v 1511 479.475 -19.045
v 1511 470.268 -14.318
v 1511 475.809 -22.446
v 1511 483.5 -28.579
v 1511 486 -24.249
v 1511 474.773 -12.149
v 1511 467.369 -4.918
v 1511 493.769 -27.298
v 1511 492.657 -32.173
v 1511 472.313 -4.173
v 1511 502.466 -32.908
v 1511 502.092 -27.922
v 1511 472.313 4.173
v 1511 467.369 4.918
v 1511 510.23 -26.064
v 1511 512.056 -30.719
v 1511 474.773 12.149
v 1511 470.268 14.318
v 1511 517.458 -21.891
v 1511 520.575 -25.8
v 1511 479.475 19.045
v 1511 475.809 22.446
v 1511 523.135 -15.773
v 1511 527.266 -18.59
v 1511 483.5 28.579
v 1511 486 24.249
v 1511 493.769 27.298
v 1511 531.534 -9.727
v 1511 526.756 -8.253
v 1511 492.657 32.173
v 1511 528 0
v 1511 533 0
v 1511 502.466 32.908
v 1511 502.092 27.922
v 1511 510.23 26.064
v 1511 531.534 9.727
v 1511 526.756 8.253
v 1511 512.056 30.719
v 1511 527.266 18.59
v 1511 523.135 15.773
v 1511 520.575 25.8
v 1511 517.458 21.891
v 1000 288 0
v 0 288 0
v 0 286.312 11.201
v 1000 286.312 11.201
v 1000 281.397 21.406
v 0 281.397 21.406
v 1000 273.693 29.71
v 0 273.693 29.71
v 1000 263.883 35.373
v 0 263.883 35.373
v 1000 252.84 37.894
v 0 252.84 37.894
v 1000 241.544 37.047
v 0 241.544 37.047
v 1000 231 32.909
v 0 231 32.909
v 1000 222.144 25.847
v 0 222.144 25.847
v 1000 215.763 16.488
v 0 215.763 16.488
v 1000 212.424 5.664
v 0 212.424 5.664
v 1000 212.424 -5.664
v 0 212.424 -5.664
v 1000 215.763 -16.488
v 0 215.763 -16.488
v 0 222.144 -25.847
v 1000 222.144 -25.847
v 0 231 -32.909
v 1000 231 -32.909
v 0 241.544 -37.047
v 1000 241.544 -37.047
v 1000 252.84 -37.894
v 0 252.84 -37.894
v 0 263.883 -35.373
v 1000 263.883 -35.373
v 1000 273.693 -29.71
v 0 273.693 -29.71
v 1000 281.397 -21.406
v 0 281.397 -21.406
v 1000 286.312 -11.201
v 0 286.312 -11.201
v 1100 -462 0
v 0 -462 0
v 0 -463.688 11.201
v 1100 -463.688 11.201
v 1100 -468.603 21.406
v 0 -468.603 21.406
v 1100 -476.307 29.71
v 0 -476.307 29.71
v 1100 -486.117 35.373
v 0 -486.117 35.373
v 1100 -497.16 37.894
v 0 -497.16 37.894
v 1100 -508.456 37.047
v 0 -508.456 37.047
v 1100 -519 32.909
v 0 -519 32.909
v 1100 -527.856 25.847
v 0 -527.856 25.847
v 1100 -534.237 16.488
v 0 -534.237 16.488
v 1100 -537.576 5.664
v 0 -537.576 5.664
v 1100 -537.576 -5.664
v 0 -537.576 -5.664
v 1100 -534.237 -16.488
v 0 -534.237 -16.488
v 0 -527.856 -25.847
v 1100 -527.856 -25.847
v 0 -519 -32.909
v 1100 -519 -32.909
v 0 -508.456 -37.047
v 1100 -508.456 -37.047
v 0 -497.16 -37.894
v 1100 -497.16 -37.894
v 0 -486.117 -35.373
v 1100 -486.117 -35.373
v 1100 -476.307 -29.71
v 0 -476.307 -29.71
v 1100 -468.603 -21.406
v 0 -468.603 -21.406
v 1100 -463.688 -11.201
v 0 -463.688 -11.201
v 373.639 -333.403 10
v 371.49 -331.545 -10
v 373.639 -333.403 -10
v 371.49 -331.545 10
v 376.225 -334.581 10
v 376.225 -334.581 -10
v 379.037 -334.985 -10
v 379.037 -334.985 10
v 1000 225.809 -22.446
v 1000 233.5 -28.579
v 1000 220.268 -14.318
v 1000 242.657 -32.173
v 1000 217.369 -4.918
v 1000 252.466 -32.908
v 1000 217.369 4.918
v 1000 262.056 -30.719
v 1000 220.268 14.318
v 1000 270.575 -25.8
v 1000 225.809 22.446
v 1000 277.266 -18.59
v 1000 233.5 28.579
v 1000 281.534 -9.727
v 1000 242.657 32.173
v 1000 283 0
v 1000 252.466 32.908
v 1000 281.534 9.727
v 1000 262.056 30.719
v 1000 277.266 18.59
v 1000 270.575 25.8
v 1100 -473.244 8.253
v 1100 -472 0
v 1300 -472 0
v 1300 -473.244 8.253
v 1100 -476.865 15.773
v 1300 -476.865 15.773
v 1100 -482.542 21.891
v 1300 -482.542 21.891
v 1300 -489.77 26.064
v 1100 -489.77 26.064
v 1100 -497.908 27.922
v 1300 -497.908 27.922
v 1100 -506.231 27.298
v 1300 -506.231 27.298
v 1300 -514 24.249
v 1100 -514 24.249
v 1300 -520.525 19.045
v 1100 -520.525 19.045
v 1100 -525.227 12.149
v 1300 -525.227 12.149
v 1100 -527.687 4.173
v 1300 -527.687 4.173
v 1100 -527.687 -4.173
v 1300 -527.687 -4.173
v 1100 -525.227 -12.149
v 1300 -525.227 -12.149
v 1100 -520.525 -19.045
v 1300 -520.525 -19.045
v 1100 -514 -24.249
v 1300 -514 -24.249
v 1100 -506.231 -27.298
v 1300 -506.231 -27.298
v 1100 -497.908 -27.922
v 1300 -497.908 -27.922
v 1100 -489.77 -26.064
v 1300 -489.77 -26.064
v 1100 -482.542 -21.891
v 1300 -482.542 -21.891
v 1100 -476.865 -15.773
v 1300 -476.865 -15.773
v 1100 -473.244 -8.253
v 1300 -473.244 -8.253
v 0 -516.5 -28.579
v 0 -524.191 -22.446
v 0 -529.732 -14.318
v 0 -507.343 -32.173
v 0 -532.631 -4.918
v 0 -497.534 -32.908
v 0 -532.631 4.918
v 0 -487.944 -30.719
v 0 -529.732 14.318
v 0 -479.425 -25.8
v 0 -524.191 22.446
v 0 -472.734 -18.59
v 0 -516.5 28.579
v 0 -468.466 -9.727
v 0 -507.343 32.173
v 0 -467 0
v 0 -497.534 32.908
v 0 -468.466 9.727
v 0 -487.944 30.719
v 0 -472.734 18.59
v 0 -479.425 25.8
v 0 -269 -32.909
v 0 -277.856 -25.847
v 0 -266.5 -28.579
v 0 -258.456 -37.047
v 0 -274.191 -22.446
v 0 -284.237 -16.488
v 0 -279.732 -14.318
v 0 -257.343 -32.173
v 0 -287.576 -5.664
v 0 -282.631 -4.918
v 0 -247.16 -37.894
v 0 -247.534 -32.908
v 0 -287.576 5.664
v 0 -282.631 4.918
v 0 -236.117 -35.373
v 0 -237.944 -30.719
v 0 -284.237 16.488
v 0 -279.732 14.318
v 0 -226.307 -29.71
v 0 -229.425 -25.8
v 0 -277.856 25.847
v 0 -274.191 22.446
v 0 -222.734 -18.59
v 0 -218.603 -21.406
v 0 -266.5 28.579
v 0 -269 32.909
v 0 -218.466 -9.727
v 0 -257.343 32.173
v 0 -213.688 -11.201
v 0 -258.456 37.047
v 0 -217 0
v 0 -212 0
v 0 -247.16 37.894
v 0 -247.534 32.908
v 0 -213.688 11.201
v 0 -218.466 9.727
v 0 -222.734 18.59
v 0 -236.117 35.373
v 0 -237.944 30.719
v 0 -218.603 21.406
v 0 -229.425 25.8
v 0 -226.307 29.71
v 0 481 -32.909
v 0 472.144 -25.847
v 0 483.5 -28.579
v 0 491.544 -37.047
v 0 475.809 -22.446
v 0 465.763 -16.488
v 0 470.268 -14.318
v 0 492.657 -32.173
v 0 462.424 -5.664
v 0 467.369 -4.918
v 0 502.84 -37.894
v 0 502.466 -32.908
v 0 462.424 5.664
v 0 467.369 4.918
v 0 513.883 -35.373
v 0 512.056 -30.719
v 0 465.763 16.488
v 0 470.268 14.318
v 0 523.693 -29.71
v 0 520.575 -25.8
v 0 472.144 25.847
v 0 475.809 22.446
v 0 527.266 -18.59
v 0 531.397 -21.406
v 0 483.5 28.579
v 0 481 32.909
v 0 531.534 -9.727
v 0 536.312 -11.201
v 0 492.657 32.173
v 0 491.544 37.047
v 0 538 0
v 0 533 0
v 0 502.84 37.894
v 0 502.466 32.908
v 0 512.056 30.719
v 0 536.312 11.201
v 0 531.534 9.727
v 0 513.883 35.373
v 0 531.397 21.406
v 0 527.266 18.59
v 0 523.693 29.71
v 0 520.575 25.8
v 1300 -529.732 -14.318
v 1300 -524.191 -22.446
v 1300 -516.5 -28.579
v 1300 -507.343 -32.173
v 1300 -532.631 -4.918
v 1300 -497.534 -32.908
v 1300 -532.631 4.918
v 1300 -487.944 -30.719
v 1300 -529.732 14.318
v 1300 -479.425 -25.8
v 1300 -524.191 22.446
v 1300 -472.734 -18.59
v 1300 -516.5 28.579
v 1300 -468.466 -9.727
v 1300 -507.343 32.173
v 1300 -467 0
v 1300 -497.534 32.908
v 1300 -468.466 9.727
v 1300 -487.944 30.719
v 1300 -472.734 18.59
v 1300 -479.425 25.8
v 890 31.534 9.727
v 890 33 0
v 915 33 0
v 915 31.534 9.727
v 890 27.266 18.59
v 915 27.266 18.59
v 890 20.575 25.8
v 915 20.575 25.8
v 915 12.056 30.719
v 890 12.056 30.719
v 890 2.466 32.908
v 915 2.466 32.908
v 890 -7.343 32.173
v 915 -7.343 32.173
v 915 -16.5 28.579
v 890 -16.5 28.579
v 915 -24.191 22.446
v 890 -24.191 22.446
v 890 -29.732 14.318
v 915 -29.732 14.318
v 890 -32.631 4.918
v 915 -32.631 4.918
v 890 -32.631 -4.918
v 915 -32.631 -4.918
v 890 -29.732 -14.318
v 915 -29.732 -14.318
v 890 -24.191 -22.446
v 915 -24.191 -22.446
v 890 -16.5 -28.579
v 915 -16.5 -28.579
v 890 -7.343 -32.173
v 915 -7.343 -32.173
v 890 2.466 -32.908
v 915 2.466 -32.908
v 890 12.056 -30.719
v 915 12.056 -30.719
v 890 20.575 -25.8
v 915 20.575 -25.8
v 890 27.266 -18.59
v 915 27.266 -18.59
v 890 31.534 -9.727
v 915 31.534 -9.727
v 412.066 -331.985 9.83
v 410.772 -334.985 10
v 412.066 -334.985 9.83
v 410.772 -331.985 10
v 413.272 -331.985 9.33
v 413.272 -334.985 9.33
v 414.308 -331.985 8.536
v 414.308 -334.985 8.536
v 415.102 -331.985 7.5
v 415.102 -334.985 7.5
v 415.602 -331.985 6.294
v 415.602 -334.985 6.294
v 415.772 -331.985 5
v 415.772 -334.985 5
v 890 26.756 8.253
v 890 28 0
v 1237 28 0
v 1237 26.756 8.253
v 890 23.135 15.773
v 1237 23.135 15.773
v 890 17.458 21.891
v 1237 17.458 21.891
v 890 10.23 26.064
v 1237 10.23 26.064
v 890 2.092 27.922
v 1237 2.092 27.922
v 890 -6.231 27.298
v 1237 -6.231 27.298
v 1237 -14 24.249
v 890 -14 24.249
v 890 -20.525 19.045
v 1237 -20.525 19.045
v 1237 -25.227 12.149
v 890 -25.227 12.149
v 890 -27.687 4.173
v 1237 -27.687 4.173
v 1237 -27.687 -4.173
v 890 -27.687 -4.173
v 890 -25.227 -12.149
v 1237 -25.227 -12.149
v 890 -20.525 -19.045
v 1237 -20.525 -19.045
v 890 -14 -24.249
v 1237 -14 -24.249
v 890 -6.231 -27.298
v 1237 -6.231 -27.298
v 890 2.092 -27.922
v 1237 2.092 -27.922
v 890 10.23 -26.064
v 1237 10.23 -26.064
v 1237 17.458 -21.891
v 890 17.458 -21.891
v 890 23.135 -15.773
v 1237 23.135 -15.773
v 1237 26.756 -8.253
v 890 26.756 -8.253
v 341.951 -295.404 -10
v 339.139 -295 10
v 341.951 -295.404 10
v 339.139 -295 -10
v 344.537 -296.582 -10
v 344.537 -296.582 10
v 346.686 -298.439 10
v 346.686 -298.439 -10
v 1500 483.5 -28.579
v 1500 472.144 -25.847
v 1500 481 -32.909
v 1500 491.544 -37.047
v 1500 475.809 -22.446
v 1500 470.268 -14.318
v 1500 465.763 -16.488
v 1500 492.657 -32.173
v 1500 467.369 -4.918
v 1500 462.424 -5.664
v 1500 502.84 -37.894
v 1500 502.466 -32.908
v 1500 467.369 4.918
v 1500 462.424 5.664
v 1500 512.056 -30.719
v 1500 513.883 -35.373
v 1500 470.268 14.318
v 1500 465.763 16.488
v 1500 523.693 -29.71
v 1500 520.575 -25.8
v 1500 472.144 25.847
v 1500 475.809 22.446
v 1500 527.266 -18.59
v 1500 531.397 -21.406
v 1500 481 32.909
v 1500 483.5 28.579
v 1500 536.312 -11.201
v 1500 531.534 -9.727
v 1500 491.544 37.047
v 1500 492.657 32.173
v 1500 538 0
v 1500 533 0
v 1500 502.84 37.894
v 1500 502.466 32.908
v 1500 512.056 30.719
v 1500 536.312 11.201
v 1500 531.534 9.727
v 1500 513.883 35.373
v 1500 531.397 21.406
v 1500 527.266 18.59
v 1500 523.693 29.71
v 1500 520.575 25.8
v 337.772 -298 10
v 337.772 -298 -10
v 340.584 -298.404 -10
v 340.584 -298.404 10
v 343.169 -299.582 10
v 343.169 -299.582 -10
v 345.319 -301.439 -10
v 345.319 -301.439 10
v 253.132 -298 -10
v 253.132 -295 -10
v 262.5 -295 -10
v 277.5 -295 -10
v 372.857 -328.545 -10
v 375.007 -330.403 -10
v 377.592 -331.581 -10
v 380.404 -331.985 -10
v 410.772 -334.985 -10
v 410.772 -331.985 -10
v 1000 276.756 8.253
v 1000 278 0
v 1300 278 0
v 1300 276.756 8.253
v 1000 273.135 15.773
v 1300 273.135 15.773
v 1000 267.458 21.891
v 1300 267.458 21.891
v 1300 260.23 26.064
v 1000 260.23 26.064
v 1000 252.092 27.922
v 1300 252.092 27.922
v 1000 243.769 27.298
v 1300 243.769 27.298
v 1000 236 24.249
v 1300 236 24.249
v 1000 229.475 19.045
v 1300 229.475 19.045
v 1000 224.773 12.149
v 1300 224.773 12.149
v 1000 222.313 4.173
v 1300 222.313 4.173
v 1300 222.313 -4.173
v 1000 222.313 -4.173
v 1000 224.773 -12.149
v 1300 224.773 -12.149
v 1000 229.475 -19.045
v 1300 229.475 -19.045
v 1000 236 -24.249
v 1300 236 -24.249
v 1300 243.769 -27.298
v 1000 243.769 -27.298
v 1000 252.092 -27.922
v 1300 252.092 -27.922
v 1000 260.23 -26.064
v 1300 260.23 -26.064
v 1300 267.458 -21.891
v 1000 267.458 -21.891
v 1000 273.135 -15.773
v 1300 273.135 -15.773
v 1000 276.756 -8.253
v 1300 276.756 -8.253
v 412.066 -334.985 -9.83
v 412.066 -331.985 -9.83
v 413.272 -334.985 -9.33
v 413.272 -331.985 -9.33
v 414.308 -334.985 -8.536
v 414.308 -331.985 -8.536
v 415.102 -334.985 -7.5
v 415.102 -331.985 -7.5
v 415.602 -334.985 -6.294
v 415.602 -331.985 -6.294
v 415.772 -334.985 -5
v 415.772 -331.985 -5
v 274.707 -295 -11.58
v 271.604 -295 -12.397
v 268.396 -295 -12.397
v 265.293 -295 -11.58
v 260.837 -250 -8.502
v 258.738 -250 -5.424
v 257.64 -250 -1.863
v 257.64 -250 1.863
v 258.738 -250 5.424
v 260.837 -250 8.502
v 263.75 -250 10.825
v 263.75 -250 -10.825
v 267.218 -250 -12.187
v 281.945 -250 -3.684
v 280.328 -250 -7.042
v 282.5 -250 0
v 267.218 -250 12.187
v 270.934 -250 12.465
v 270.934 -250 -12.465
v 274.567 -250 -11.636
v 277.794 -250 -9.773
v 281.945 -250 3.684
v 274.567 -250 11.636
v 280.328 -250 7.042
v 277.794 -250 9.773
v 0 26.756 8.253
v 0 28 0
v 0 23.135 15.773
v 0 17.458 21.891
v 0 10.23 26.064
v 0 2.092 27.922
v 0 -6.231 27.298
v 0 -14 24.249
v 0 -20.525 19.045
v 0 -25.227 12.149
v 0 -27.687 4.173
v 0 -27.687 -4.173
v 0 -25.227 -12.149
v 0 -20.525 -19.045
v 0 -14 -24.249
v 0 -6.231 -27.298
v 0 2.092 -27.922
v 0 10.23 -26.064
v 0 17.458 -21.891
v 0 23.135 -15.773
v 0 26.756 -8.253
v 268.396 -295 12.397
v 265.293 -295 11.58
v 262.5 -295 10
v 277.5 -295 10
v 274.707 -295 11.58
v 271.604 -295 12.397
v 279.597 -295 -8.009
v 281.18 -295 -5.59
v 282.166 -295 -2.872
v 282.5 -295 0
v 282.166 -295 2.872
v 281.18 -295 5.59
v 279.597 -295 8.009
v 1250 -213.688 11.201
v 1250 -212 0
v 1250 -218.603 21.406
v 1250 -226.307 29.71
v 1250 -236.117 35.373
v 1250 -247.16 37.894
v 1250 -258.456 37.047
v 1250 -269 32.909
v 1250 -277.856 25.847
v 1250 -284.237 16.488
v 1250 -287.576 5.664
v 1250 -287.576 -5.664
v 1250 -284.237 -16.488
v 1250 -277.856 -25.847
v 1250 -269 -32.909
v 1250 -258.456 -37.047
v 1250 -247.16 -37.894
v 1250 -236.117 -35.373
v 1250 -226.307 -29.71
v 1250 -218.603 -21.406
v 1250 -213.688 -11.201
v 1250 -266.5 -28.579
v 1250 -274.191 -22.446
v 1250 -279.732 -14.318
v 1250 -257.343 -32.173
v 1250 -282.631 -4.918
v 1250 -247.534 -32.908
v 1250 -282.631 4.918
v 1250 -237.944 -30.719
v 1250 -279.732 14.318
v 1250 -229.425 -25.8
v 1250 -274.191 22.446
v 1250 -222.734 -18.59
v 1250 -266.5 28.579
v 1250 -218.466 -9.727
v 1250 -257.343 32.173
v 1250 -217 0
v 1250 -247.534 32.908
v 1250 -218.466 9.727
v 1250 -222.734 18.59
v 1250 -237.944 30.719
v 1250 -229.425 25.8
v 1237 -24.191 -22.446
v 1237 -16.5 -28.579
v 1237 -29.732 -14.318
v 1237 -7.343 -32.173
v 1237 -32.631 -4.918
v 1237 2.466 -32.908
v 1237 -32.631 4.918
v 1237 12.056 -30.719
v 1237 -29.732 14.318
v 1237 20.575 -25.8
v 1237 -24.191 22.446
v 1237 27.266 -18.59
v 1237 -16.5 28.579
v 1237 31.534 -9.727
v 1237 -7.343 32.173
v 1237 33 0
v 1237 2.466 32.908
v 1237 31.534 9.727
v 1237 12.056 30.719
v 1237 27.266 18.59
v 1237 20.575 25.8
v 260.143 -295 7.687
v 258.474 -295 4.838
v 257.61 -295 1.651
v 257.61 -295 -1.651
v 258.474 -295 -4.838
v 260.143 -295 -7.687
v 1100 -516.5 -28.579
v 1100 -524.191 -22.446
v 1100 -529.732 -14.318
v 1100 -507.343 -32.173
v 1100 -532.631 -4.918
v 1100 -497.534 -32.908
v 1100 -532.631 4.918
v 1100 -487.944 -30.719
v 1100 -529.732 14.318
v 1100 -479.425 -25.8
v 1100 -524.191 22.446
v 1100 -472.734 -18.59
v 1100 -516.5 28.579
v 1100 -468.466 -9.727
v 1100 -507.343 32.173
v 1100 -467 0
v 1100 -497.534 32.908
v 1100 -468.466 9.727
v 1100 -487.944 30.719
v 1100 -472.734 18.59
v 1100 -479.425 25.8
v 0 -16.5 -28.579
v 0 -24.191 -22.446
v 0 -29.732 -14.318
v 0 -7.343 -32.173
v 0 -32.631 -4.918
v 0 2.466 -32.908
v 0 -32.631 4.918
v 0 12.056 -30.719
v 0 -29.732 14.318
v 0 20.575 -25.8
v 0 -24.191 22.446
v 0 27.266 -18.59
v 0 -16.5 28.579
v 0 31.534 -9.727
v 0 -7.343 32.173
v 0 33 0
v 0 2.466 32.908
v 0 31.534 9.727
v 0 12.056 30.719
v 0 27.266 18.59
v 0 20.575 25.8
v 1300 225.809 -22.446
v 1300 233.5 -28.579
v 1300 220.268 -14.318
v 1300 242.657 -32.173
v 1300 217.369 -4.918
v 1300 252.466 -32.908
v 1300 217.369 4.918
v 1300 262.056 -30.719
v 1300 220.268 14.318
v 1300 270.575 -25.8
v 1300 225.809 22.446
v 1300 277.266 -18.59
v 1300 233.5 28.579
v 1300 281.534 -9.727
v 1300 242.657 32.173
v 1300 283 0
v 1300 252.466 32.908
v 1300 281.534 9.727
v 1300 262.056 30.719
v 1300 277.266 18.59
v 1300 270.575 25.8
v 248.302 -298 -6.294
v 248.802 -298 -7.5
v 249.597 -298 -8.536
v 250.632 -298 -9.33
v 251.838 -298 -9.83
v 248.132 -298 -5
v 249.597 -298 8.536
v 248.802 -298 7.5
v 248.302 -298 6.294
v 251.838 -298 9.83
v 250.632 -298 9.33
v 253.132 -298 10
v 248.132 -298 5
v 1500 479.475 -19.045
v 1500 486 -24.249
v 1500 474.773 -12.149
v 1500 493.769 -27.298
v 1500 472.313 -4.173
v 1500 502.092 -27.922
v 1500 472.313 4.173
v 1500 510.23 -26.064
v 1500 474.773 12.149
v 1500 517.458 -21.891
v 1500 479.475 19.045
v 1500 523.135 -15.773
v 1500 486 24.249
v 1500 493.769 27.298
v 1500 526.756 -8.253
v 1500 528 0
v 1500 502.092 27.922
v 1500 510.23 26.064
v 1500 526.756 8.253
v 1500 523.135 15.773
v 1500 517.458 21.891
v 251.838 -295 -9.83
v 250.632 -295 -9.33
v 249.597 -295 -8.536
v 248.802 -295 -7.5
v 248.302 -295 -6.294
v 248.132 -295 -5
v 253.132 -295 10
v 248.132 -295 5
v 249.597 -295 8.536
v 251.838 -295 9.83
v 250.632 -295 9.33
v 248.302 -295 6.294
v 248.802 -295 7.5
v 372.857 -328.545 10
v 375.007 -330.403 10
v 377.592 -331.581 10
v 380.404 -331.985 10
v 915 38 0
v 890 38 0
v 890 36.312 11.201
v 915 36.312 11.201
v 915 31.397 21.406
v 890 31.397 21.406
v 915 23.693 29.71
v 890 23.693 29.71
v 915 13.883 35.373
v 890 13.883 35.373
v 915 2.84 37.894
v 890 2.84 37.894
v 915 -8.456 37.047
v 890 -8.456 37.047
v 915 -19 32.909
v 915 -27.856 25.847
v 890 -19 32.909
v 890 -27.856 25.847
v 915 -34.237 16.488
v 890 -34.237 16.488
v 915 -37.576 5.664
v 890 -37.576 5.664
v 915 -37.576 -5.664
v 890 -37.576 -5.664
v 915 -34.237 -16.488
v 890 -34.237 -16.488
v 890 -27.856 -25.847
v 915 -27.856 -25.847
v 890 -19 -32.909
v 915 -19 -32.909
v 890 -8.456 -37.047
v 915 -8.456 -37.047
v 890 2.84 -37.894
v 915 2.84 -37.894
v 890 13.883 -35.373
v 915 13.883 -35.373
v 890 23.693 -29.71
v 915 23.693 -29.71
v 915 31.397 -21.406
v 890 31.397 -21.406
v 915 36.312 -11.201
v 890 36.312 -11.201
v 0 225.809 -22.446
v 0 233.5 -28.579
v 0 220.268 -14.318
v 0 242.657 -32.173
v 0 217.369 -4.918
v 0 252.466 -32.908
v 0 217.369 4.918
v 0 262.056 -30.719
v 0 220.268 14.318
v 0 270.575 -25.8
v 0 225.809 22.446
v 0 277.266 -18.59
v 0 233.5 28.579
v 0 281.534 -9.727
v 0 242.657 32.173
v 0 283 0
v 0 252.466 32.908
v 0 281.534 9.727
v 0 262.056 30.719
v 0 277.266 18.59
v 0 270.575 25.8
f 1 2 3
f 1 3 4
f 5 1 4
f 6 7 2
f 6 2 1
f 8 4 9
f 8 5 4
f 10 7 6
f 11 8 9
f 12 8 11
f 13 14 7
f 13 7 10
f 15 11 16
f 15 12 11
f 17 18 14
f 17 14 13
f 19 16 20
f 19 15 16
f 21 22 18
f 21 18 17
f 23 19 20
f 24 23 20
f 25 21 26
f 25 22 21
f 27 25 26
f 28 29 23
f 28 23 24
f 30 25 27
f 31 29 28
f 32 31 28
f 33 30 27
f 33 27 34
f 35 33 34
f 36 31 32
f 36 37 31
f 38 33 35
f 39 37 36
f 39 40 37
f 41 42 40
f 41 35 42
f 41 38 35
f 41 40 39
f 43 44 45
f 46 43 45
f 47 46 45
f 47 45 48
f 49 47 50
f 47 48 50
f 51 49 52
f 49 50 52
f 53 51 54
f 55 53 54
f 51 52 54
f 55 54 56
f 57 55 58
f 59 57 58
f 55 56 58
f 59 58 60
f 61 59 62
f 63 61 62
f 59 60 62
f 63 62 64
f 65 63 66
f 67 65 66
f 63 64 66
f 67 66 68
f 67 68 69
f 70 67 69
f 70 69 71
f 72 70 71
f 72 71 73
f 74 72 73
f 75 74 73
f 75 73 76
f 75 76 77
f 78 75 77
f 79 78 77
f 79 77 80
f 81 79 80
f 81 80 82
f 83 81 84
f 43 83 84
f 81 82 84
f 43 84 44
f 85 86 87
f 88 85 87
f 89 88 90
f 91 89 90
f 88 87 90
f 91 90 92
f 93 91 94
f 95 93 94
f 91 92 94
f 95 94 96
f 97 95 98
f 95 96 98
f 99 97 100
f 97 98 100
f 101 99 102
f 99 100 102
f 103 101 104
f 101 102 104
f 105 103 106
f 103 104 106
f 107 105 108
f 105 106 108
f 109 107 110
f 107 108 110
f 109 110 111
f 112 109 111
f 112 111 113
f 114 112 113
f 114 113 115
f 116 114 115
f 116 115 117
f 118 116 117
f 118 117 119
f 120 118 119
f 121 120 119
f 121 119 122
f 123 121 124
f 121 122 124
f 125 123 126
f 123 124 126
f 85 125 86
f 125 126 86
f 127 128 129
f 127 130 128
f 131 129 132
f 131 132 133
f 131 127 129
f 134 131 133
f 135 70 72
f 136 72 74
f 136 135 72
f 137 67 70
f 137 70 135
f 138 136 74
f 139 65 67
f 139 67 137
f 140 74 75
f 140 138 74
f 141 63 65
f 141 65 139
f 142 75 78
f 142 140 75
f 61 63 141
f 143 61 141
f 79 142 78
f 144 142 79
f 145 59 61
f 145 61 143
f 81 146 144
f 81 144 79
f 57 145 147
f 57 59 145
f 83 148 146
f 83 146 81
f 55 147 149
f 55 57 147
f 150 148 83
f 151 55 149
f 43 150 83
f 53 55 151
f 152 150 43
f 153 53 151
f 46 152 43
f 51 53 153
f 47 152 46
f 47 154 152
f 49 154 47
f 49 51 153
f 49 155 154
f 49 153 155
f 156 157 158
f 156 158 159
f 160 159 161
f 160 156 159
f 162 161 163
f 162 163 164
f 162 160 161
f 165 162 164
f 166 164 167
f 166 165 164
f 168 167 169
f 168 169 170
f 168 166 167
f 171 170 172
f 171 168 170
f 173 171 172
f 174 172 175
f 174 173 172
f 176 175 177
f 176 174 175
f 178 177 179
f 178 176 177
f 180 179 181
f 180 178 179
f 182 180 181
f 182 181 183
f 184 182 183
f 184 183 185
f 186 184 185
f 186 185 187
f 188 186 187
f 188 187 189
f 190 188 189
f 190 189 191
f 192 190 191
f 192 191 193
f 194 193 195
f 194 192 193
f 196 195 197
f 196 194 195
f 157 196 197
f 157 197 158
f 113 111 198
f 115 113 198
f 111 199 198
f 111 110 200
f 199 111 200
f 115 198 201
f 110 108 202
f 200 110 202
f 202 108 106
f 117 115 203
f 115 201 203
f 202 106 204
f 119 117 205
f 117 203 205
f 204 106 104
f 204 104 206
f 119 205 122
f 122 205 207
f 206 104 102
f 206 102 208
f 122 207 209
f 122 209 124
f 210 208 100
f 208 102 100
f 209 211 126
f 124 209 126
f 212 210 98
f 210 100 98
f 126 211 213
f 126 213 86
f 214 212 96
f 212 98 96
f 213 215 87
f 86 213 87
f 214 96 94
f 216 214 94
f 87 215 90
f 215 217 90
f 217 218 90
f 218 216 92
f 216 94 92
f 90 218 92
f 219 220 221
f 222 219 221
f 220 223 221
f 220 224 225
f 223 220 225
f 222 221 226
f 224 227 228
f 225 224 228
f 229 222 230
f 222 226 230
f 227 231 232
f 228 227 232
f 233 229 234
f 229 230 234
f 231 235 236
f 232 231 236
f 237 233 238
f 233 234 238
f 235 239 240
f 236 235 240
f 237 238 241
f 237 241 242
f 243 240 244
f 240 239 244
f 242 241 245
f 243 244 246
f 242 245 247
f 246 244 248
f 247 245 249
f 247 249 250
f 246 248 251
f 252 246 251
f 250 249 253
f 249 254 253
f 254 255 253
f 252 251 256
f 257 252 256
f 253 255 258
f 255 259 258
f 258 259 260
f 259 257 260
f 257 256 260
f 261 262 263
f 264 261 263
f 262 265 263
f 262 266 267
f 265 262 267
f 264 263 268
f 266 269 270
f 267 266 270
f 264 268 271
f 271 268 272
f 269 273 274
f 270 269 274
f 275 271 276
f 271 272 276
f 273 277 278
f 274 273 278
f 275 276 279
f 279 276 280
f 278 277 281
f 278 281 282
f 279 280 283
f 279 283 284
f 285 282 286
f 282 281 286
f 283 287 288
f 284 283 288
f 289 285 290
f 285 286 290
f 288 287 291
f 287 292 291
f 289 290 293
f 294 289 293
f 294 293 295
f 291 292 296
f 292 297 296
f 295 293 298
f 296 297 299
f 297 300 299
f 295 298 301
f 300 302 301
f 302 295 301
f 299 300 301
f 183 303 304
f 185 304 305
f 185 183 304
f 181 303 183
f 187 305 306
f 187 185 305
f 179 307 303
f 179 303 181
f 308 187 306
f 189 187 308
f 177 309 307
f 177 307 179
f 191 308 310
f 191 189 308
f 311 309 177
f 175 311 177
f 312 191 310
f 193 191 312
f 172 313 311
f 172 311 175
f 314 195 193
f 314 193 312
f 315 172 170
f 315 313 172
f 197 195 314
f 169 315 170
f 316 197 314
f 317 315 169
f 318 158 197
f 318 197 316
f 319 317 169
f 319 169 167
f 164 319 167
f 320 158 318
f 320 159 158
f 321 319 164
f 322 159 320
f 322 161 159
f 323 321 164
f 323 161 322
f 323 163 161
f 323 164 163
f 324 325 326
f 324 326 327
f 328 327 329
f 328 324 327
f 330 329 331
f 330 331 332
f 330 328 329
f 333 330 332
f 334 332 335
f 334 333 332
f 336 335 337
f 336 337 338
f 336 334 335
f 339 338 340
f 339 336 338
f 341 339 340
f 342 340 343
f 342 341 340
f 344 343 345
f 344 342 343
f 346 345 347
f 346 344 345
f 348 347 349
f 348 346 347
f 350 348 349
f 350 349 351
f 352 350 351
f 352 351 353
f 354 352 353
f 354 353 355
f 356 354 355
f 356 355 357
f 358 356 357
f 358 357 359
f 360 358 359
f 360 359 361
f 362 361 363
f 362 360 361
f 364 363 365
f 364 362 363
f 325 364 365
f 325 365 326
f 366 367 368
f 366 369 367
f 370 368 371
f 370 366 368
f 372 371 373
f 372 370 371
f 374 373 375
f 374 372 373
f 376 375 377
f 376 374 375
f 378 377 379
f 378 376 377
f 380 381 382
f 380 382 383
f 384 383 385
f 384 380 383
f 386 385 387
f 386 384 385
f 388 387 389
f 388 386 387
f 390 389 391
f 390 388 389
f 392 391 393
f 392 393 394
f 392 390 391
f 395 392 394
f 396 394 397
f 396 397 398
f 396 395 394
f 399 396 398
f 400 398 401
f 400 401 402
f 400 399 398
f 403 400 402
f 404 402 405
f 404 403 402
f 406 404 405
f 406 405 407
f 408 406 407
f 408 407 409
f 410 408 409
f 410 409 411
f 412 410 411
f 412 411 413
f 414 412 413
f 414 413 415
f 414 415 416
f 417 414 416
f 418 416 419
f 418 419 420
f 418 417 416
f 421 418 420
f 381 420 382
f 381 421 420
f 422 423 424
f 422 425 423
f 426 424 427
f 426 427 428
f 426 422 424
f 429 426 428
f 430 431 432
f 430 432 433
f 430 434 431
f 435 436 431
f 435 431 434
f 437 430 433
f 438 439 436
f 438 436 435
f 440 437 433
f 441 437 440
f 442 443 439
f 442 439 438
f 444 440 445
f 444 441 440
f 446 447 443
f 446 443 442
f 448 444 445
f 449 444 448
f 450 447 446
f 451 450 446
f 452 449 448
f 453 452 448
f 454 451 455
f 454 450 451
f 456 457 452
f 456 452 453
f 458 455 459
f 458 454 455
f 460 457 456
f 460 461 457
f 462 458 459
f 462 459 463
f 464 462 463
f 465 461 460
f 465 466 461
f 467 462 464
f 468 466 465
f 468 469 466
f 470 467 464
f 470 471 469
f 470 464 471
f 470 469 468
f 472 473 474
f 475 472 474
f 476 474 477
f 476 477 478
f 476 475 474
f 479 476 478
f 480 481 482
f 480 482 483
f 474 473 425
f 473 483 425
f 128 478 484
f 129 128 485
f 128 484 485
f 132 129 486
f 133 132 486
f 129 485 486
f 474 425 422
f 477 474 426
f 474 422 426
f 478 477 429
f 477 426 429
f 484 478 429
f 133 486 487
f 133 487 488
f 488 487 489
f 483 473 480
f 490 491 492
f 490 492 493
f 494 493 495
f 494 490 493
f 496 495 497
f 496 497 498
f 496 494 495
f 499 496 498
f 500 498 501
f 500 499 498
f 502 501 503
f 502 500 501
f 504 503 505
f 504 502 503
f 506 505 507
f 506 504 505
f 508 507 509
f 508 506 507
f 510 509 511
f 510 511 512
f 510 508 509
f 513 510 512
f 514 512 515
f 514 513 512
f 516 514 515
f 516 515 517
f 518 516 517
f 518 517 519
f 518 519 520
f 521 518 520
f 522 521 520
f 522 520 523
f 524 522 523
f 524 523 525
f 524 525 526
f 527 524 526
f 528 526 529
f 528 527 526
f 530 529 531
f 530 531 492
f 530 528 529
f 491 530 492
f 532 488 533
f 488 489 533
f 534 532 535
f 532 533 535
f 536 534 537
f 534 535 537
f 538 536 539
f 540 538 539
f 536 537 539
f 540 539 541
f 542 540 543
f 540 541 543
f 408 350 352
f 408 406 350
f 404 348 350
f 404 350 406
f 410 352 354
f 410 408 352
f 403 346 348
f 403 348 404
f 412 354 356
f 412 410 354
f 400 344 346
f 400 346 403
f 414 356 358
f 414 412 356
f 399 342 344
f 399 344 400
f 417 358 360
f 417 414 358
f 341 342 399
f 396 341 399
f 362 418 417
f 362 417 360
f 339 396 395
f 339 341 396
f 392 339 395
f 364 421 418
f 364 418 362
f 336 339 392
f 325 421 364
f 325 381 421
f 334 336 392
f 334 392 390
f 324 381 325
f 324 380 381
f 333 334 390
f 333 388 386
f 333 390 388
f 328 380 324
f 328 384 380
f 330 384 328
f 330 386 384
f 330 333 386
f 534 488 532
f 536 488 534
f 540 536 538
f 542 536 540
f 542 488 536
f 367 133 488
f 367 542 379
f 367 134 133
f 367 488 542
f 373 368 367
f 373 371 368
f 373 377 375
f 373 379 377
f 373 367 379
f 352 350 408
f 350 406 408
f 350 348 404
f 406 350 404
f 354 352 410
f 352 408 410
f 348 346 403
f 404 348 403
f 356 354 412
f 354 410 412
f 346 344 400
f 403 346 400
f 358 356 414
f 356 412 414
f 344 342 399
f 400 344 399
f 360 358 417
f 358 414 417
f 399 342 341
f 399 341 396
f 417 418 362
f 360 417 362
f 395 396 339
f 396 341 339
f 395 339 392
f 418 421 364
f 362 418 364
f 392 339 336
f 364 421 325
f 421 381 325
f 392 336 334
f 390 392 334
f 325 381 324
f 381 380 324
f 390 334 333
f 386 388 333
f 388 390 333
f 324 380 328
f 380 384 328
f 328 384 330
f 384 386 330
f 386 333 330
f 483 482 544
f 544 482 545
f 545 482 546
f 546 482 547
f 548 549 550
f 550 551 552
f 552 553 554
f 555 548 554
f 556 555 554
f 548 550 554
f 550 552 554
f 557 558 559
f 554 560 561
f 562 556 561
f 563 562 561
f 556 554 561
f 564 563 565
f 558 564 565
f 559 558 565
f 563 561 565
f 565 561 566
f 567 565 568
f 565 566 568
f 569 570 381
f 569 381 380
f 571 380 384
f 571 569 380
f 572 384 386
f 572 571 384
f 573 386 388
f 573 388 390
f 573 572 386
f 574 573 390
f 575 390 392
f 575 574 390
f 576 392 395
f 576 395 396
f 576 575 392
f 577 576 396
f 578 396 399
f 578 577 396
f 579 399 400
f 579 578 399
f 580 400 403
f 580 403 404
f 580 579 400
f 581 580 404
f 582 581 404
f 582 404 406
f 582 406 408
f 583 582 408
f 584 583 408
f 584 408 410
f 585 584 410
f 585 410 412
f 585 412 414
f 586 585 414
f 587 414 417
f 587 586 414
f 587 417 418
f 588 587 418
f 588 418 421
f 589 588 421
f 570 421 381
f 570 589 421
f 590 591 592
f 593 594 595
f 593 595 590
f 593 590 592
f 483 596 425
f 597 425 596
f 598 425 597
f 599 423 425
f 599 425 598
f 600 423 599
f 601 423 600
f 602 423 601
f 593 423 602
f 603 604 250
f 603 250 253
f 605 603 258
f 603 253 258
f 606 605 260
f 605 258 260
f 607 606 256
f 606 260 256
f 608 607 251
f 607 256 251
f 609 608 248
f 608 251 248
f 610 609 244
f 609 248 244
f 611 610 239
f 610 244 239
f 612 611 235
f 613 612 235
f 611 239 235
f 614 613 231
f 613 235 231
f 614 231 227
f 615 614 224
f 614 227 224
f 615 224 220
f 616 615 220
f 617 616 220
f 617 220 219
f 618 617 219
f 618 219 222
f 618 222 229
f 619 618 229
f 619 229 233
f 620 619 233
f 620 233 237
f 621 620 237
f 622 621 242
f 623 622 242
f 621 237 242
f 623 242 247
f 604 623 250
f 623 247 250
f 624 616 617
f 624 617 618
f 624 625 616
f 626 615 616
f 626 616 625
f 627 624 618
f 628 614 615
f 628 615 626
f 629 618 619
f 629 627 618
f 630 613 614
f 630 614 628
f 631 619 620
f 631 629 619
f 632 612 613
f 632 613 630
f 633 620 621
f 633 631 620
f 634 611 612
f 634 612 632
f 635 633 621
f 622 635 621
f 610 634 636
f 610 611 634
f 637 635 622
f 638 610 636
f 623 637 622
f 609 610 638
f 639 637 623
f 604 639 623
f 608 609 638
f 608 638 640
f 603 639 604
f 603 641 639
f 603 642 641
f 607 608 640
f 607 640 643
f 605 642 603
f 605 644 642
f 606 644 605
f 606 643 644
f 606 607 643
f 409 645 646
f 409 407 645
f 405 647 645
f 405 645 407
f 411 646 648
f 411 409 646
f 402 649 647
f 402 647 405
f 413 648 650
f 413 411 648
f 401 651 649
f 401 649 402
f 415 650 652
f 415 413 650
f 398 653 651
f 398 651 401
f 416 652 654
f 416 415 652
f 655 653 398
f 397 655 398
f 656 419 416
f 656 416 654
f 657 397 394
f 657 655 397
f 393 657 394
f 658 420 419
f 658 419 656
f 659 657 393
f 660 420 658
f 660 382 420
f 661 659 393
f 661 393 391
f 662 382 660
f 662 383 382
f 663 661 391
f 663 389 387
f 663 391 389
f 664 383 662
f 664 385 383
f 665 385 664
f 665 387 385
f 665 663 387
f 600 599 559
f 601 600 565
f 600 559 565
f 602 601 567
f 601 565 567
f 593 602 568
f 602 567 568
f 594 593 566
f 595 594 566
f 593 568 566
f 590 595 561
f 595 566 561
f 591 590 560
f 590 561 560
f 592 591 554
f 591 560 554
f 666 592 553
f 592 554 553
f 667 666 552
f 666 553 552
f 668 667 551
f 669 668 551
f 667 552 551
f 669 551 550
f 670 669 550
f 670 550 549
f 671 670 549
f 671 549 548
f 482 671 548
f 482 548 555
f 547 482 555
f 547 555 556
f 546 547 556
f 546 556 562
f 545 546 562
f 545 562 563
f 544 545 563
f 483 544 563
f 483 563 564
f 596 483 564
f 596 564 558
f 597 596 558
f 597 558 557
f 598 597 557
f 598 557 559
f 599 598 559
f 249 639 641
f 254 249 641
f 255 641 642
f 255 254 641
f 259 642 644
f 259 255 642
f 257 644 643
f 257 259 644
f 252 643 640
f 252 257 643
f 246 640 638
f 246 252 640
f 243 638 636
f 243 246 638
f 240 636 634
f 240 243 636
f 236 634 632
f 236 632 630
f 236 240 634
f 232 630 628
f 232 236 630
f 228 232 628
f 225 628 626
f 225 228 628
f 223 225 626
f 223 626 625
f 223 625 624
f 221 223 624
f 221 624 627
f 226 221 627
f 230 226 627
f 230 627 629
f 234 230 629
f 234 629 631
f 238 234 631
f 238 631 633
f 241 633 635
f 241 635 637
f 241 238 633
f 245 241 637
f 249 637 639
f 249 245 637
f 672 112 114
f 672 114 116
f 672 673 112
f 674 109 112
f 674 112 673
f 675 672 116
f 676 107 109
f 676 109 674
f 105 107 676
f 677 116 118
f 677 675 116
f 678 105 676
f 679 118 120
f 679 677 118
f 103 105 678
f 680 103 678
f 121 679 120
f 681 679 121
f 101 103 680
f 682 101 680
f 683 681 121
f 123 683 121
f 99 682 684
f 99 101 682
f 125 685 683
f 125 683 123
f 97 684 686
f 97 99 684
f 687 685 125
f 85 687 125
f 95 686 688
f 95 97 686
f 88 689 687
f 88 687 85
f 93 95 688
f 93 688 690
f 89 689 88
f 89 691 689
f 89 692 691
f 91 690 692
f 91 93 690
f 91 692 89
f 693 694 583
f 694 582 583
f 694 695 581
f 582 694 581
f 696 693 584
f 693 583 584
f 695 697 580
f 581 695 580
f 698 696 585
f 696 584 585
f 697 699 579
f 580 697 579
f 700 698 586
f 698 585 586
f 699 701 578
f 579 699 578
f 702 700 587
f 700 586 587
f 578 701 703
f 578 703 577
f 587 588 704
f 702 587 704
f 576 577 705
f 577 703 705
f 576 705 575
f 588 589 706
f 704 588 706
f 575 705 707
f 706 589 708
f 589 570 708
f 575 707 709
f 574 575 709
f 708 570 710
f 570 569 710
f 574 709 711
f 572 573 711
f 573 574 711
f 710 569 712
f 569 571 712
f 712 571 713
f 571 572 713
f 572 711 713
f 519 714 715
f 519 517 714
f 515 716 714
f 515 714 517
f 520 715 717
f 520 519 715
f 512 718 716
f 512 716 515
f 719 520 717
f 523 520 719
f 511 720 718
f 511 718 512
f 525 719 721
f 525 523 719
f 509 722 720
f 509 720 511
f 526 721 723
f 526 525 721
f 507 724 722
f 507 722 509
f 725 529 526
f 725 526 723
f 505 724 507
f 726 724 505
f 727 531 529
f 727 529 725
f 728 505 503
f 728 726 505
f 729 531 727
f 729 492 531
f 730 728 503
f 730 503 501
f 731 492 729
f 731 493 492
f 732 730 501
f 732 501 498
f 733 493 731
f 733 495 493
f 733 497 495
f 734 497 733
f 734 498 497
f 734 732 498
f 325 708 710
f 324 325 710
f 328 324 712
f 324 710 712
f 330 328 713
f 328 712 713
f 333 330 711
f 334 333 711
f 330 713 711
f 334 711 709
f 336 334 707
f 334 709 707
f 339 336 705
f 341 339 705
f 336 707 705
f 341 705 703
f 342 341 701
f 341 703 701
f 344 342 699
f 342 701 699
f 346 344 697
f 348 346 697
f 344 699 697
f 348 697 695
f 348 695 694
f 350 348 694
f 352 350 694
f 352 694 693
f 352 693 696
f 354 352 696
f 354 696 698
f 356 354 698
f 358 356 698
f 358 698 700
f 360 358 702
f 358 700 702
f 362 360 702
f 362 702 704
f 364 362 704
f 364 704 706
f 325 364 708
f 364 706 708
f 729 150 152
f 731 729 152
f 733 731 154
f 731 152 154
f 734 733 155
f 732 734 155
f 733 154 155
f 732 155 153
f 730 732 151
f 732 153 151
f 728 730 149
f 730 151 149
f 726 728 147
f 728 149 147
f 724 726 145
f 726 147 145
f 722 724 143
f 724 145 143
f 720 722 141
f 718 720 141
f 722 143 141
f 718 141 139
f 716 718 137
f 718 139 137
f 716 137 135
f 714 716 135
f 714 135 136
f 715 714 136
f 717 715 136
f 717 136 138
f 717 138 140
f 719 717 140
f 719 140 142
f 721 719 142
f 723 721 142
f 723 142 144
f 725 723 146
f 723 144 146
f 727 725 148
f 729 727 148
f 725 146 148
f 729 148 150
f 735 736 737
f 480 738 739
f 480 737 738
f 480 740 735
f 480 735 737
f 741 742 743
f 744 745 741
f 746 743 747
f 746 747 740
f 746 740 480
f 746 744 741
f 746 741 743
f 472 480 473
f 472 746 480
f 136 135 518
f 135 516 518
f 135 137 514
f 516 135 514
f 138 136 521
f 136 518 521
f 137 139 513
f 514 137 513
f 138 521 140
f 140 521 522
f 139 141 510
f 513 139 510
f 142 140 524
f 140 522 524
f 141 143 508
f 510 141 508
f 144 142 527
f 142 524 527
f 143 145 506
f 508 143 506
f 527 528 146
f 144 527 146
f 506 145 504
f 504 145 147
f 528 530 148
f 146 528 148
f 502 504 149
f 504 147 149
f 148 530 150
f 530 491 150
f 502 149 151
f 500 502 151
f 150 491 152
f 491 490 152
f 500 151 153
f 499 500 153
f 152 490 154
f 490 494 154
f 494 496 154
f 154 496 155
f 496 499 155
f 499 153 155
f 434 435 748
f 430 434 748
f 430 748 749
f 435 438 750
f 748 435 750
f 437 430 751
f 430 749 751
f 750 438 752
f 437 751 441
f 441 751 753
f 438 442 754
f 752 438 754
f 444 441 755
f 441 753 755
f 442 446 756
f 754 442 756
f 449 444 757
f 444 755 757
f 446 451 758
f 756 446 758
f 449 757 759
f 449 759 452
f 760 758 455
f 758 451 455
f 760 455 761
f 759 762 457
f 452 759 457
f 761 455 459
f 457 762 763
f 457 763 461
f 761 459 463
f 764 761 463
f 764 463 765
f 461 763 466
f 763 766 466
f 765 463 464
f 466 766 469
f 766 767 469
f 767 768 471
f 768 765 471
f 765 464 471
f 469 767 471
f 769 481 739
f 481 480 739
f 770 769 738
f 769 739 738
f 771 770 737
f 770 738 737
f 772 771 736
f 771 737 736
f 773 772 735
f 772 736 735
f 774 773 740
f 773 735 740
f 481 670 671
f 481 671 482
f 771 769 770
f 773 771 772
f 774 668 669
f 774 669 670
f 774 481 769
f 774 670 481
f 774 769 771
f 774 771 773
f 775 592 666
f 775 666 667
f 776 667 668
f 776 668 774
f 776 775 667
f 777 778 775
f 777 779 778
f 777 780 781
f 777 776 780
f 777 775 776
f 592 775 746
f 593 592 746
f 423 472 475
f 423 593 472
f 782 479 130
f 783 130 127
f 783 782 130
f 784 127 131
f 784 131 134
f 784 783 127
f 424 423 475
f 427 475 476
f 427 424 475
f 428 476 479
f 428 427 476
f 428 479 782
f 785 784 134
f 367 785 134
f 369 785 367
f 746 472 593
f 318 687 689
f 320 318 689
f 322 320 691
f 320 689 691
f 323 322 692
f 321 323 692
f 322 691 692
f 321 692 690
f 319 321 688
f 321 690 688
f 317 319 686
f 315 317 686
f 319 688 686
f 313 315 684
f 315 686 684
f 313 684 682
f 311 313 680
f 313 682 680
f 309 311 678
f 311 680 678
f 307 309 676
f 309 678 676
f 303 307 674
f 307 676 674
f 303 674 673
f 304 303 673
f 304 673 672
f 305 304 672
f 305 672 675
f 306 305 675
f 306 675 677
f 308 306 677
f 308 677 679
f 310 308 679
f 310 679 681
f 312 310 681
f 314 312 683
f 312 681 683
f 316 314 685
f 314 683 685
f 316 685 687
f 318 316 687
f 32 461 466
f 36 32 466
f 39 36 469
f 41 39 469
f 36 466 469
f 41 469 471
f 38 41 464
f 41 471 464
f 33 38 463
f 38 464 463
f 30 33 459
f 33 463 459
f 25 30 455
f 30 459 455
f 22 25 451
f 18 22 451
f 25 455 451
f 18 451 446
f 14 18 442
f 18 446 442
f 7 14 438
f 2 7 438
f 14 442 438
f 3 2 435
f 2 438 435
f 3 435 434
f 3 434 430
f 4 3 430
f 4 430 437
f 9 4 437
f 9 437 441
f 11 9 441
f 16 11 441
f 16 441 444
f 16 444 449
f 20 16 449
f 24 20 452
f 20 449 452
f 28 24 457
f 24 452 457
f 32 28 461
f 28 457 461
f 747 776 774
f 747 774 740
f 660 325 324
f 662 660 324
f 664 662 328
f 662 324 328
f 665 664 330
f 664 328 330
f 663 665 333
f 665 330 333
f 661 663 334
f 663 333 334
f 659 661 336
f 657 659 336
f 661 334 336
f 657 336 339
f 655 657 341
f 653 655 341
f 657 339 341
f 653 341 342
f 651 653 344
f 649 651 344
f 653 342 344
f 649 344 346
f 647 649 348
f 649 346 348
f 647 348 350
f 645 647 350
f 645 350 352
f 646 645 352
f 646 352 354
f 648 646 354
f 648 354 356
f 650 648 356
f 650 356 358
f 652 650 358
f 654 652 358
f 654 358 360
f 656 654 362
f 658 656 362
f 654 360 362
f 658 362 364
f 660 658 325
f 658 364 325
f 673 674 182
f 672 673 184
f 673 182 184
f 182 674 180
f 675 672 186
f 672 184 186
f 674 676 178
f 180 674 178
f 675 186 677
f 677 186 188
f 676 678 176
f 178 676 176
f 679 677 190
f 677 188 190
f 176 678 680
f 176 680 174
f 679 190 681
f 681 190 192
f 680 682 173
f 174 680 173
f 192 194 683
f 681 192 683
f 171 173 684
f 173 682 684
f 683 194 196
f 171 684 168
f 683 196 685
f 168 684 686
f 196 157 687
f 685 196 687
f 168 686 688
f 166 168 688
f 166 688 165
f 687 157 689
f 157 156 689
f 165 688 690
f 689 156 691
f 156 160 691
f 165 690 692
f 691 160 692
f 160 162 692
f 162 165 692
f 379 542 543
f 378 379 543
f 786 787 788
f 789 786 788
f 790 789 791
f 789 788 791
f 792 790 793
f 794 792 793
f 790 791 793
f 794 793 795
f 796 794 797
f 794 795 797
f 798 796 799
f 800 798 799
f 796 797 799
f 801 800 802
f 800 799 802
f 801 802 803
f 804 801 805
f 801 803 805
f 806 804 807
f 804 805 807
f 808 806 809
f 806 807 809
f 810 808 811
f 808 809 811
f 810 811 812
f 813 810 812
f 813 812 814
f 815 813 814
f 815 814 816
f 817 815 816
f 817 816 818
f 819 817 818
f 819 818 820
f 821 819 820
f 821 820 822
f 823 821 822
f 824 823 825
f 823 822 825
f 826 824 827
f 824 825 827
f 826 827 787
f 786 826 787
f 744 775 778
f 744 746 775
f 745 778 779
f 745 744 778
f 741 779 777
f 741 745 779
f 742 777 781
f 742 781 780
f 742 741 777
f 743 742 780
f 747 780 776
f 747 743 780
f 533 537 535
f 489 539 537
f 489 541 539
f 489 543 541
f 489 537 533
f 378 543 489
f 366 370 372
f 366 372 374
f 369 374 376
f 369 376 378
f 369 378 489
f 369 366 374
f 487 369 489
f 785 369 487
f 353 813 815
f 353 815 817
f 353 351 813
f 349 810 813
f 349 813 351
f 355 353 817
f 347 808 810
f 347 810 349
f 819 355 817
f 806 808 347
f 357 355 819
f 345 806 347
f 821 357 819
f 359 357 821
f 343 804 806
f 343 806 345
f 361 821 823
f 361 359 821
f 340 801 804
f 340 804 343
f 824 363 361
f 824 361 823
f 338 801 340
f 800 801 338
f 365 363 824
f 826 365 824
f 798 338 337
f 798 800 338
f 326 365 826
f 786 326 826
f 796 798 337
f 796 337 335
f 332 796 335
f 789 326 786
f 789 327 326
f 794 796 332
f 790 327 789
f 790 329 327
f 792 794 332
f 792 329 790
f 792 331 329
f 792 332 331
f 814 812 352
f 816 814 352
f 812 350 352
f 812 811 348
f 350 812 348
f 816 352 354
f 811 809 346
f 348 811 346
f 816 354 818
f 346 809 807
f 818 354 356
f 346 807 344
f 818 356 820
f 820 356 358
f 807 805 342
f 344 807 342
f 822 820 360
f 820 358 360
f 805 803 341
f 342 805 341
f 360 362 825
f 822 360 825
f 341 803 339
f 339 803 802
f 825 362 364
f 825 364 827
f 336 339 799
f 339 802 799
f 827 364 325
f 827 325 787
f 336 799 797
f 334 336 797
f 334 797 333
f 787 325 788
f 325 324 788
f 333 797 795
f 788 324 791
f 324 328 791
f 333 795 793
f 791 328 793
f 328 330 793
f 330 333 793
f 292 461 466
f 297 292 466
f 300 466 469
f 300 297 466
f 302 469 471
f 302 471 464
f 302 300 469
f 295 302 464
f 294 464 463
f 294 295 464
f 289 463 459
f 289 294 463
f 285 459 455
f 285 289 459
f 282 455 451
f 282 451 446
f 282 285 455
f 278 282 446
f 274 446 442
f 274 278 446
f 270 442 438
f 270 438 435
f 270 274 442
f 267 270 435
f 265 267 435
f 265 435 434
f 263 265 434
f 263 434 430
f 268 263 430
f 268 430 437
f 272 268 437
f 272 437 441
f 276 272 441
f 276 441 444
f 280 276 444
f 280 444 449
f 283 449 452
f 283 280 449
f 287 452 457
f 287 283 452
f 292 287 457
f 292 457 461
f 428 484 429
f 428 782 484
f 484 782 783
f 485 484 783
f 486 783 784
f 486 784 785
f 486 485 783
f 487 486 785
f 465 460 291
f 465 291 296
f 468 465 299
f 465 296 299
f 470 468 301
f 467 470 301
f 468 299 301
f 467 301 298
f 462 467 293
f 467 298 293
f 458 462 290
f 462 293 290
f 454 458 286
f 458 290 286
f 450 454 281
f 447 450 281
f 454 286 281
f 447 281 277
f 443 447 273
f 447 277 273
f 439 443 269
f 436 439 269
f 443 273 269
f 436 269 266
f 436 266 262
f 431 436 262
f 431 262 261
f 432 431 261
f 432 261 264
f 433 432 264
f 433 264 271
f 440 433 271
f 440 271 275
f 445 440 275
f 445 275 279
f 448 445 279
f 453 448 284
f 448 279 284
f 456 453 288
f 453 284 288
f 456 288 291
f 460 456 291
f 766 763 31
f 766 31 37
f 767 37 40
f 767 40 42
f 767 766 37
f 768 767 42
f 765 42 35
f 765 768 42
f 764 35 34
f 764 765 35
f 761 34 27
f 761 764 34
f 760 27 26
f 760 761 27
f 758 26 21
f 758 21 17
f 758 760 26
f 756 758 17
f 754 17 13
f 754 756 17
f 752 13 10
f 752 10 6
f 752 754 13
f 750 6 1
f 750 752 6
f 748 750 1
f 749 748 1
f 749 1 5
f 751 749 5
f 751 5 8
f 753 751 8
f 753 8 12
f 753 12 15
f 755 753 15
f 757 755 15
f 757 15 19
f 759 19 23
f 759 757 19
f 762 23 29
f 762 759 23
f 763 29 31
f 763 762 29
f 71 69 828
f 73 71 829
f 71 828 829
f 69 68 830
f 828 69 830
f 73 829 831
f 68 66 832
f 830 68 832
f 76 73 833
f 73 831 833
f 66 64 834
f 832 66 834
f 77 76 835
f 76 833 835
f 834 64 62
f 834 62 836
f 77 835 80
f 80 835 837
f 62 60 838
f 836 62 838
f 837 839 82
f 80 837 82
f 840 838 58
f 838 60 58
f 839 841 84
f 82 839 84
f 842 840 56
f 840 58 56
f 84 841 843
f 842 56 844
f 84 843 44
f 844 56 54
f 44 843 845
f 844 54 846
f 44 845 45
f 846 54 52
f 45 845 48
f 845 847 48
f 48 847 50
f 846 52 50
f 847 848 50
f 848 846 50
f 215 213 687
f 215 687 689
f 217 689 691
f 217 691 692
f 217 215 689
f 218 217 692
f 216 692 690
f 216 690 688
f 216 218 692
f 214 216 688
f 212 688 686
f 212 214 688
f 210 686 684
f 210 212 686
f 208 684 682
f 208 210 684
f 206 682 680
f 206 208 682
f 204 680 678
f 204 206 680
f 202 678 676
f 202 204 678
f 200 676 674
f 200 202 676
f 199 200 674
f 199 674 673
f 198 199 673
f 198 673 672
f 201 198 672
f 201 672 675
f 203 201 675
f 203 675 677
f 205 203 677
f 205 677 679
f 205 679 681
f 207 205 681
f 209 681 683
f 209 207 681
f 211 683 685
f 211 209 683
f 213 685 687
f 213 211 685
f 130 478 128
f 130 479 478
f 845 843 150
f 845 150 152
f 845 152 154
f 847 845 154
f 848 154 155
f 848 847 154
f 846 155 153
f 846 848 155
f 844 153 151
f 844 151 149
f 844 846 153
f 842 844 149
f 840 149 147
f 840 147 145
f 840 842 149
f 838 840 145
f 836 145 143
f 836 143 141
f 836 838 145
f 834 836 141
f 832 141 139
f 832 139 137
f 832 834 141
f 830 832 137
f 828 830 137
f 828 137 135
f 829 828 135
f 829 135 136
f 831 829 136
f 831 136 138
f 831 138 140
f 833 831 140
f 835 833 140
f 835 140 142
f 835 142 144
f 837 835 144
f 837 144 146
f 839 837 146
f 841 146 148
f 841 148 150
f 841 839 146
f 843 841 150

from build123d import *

# Parameters (mm, degrees)
F0_R      = 38
F0_R_2    = 32.9999953508
F1_DEPTH  = 1100
F2_R      = 32.9999953508
F2_R_2    = 28.0000001192
F3_DEPTH  = 200
F0_R_3    = 33.0000013113
F4_DEPTH  = 1250
F0_R_4    = 32.9999998212
F0_R_5    = 27.9999990016
F5_DEPTH  = 890
F6_R      = 37.9999998212
F6_R_2    = 32.9999998212
F7_DEPTH  = 25
F8_DEPTH  = 347
F0_R_6    = 32.9999983311
F9_DEPTH  = 1000
F10_R     = 32.9999983311
F10_R_2   = 27.9999956489
F11_DEPTH = 300
F0_R_7    = 33.0000042915
F12_DEPTH = 1500
F13_R     = 33.0000042915
F13_R_2   = 28.0000090599
F14_DEPTH = 11
F16_R     = 12.5
F17_DEPTH = 45
F20_DEPTH = 10
F21_R     = 5
F22_R     = 10


# Not quite as in the source:
# - the program builds the solid bodies; features that only make, move or delete a surface that nothing else refers to are left out


with BuildPart() as f1:
    # F0 (on Right) → F1 (new body)
    with BuildSketch(Plane.YZ):
        with Locations((-500, 0)):
            Circle(F0_R)
        with Locations((-500, 0)):
            Circle(F0_R_2, mode=Mode.SUBTRACT)
    extrude(amount=F1_DEPTH)


with BuildPart() as f3:
    # F2 (on face) → F3 (new body)
    with BuildSketch(Plane.YZ.offset(1100)):
        with Locations((-500, 0)):
            Circle(F2_R)
        with Locations((-500, 0)):
            Circle(F2_R_2, mode=Mode.SUBTRACT)
    extrude(amount=F3_DEPTH)


with BuildPart() as f4:
    # F0 (on Right) → F4 (new body)
    with BuildSketch(Plane.YZ):
        with Locations((-250, 0)):
            Circle(F0_R)
        with Locations((-250, 0)):
            Circle(F0_R_3, mode=Mode.SUBTRACT)
    extrude(amount=F4_DEPTH)


with BuildPart() as f5:
    # F0 (on Right) → F5 (new body)
    with BuildSketch(Plane.YZ):
        Circle(F0_R_4)
        Circle(F0_R_5, mode=Mode.SUBTRACT)
    extrude(amount=F5_DEPTH)


with BuildPart() as f7:
    # F6 (on face) → F7 (new body)
    with BuildSketch(Plane.YZ.offset(890)):
        Circle(F6_R)
        Circle(F6_R_2, mode=Mode.SUBTRACT)
    extrude(amount=F7_DEPTH)


with BuildPart() as f8:
    # F8 (new): a face of the model
    f8_faces = [f5.part.faces().sort_by_distance(p)[0] for p in [
        (890, -32.0666188751, 0),
    ]]
    extrude(f8_faces, amount=F8_DEPTH)


with BuildPart() as f9:
    # F0 (on Right) → F9 (new body)
    with BuildSketch(Plane.YZ):
        with Locations((250, 0)):
            Circle(F0_R)
        with Locations((250, 0)):
            Circle(F0_R_6, mode=Mode.SUBTRACT)
    extrude(amount=F9_DEPTH)


with BuildPart() as f11:
    # F10 (on face) → F11 (new body)
    with BuildSketch(Plane.YZ.offset(1000)):
        with Locations((250, 0)):
            Circle(F10_R)
        with Locations((250, 0)):
            Circle(F10_R_2, mode=Mode.SUBTRACT)
    extrude(amount=F11_DEPTH)


with BuildPart() as f12:
    # F0 (on Right) → F12 (new body)
    with BuildSketch(Plane.YZ):
        with Locations((500, 0)):
            Circle(F0_R)
        with Locations((500, 0)):
            Circle(F0_R_7, mode=Mode.SUBTRACT)
    extrude(amount=F12_DEPTH)


with BuildPart() as f14:
    # F13 (on face) → F14 (new body)
    with BuildSketch(Plane.YZ.offset(1500)):
        with Locations((500, 0)):
            Circle(F13_R)
        with Locations((500, 0)):
            Circle(F13_R_2, mode=Mode.SUBTRACT)
    extrude(amount=F14_DEPTH)


with BuildPart() as f17:
    # F16 (on plane+point) → F17 (new body)
    with BuildSketch(Plane.XZ.offset(250)):
        with Locations((270, 0)):
            Circle(F16_R)
    extrude(amount=F17_DEPTH)

    # F18 (on Top) → F20 (join, symmetric)
    with BuildSketch(Plane.XY):
        Polygon((343.6963860454, -295), (248.1320642157, -295), (248.1320642157, -298), (342.3292072788, -298), (374.479667039, -334.9848731859), (396.771981816, -334.9848731859), (400.771981816, -334.9848731859), (415.771981816, -334.9848731859), (415.771981816, -331.9848731859), (375.8468458056, -331.9848731859), align=None)
    extrude(amount=F20_DEPTH, both=True)

    # F21
    f21_edges = [f17.edges().sort_by_distance(p)[0] for p in [
        (415.771982, -333.484873, 10),
        (415.771982, -333.484873, -10),
        (248.132064, -296.5, 10),
        (248.132064, -296.5, -10),
    ]]
    fillet(f21_edges, radius=F21_R)

    # F22
    f22_edges = [f17.edges().sort_by_distance(p)[0] for p in [
        (342.329207, -298, 0),
        (374.479667, -334.984873, 0),
        (375.846846, -331.984873, 0),
        (343.696386, -295, 0),
    ]]
    fillet(f22_edges, radius=F22_R)


solid = Compound([f1.part, f3.part, f4.part, f5.part, f7.part, f8.part, f9.part, f11.part, f12.part, f14.part, f17.part])
